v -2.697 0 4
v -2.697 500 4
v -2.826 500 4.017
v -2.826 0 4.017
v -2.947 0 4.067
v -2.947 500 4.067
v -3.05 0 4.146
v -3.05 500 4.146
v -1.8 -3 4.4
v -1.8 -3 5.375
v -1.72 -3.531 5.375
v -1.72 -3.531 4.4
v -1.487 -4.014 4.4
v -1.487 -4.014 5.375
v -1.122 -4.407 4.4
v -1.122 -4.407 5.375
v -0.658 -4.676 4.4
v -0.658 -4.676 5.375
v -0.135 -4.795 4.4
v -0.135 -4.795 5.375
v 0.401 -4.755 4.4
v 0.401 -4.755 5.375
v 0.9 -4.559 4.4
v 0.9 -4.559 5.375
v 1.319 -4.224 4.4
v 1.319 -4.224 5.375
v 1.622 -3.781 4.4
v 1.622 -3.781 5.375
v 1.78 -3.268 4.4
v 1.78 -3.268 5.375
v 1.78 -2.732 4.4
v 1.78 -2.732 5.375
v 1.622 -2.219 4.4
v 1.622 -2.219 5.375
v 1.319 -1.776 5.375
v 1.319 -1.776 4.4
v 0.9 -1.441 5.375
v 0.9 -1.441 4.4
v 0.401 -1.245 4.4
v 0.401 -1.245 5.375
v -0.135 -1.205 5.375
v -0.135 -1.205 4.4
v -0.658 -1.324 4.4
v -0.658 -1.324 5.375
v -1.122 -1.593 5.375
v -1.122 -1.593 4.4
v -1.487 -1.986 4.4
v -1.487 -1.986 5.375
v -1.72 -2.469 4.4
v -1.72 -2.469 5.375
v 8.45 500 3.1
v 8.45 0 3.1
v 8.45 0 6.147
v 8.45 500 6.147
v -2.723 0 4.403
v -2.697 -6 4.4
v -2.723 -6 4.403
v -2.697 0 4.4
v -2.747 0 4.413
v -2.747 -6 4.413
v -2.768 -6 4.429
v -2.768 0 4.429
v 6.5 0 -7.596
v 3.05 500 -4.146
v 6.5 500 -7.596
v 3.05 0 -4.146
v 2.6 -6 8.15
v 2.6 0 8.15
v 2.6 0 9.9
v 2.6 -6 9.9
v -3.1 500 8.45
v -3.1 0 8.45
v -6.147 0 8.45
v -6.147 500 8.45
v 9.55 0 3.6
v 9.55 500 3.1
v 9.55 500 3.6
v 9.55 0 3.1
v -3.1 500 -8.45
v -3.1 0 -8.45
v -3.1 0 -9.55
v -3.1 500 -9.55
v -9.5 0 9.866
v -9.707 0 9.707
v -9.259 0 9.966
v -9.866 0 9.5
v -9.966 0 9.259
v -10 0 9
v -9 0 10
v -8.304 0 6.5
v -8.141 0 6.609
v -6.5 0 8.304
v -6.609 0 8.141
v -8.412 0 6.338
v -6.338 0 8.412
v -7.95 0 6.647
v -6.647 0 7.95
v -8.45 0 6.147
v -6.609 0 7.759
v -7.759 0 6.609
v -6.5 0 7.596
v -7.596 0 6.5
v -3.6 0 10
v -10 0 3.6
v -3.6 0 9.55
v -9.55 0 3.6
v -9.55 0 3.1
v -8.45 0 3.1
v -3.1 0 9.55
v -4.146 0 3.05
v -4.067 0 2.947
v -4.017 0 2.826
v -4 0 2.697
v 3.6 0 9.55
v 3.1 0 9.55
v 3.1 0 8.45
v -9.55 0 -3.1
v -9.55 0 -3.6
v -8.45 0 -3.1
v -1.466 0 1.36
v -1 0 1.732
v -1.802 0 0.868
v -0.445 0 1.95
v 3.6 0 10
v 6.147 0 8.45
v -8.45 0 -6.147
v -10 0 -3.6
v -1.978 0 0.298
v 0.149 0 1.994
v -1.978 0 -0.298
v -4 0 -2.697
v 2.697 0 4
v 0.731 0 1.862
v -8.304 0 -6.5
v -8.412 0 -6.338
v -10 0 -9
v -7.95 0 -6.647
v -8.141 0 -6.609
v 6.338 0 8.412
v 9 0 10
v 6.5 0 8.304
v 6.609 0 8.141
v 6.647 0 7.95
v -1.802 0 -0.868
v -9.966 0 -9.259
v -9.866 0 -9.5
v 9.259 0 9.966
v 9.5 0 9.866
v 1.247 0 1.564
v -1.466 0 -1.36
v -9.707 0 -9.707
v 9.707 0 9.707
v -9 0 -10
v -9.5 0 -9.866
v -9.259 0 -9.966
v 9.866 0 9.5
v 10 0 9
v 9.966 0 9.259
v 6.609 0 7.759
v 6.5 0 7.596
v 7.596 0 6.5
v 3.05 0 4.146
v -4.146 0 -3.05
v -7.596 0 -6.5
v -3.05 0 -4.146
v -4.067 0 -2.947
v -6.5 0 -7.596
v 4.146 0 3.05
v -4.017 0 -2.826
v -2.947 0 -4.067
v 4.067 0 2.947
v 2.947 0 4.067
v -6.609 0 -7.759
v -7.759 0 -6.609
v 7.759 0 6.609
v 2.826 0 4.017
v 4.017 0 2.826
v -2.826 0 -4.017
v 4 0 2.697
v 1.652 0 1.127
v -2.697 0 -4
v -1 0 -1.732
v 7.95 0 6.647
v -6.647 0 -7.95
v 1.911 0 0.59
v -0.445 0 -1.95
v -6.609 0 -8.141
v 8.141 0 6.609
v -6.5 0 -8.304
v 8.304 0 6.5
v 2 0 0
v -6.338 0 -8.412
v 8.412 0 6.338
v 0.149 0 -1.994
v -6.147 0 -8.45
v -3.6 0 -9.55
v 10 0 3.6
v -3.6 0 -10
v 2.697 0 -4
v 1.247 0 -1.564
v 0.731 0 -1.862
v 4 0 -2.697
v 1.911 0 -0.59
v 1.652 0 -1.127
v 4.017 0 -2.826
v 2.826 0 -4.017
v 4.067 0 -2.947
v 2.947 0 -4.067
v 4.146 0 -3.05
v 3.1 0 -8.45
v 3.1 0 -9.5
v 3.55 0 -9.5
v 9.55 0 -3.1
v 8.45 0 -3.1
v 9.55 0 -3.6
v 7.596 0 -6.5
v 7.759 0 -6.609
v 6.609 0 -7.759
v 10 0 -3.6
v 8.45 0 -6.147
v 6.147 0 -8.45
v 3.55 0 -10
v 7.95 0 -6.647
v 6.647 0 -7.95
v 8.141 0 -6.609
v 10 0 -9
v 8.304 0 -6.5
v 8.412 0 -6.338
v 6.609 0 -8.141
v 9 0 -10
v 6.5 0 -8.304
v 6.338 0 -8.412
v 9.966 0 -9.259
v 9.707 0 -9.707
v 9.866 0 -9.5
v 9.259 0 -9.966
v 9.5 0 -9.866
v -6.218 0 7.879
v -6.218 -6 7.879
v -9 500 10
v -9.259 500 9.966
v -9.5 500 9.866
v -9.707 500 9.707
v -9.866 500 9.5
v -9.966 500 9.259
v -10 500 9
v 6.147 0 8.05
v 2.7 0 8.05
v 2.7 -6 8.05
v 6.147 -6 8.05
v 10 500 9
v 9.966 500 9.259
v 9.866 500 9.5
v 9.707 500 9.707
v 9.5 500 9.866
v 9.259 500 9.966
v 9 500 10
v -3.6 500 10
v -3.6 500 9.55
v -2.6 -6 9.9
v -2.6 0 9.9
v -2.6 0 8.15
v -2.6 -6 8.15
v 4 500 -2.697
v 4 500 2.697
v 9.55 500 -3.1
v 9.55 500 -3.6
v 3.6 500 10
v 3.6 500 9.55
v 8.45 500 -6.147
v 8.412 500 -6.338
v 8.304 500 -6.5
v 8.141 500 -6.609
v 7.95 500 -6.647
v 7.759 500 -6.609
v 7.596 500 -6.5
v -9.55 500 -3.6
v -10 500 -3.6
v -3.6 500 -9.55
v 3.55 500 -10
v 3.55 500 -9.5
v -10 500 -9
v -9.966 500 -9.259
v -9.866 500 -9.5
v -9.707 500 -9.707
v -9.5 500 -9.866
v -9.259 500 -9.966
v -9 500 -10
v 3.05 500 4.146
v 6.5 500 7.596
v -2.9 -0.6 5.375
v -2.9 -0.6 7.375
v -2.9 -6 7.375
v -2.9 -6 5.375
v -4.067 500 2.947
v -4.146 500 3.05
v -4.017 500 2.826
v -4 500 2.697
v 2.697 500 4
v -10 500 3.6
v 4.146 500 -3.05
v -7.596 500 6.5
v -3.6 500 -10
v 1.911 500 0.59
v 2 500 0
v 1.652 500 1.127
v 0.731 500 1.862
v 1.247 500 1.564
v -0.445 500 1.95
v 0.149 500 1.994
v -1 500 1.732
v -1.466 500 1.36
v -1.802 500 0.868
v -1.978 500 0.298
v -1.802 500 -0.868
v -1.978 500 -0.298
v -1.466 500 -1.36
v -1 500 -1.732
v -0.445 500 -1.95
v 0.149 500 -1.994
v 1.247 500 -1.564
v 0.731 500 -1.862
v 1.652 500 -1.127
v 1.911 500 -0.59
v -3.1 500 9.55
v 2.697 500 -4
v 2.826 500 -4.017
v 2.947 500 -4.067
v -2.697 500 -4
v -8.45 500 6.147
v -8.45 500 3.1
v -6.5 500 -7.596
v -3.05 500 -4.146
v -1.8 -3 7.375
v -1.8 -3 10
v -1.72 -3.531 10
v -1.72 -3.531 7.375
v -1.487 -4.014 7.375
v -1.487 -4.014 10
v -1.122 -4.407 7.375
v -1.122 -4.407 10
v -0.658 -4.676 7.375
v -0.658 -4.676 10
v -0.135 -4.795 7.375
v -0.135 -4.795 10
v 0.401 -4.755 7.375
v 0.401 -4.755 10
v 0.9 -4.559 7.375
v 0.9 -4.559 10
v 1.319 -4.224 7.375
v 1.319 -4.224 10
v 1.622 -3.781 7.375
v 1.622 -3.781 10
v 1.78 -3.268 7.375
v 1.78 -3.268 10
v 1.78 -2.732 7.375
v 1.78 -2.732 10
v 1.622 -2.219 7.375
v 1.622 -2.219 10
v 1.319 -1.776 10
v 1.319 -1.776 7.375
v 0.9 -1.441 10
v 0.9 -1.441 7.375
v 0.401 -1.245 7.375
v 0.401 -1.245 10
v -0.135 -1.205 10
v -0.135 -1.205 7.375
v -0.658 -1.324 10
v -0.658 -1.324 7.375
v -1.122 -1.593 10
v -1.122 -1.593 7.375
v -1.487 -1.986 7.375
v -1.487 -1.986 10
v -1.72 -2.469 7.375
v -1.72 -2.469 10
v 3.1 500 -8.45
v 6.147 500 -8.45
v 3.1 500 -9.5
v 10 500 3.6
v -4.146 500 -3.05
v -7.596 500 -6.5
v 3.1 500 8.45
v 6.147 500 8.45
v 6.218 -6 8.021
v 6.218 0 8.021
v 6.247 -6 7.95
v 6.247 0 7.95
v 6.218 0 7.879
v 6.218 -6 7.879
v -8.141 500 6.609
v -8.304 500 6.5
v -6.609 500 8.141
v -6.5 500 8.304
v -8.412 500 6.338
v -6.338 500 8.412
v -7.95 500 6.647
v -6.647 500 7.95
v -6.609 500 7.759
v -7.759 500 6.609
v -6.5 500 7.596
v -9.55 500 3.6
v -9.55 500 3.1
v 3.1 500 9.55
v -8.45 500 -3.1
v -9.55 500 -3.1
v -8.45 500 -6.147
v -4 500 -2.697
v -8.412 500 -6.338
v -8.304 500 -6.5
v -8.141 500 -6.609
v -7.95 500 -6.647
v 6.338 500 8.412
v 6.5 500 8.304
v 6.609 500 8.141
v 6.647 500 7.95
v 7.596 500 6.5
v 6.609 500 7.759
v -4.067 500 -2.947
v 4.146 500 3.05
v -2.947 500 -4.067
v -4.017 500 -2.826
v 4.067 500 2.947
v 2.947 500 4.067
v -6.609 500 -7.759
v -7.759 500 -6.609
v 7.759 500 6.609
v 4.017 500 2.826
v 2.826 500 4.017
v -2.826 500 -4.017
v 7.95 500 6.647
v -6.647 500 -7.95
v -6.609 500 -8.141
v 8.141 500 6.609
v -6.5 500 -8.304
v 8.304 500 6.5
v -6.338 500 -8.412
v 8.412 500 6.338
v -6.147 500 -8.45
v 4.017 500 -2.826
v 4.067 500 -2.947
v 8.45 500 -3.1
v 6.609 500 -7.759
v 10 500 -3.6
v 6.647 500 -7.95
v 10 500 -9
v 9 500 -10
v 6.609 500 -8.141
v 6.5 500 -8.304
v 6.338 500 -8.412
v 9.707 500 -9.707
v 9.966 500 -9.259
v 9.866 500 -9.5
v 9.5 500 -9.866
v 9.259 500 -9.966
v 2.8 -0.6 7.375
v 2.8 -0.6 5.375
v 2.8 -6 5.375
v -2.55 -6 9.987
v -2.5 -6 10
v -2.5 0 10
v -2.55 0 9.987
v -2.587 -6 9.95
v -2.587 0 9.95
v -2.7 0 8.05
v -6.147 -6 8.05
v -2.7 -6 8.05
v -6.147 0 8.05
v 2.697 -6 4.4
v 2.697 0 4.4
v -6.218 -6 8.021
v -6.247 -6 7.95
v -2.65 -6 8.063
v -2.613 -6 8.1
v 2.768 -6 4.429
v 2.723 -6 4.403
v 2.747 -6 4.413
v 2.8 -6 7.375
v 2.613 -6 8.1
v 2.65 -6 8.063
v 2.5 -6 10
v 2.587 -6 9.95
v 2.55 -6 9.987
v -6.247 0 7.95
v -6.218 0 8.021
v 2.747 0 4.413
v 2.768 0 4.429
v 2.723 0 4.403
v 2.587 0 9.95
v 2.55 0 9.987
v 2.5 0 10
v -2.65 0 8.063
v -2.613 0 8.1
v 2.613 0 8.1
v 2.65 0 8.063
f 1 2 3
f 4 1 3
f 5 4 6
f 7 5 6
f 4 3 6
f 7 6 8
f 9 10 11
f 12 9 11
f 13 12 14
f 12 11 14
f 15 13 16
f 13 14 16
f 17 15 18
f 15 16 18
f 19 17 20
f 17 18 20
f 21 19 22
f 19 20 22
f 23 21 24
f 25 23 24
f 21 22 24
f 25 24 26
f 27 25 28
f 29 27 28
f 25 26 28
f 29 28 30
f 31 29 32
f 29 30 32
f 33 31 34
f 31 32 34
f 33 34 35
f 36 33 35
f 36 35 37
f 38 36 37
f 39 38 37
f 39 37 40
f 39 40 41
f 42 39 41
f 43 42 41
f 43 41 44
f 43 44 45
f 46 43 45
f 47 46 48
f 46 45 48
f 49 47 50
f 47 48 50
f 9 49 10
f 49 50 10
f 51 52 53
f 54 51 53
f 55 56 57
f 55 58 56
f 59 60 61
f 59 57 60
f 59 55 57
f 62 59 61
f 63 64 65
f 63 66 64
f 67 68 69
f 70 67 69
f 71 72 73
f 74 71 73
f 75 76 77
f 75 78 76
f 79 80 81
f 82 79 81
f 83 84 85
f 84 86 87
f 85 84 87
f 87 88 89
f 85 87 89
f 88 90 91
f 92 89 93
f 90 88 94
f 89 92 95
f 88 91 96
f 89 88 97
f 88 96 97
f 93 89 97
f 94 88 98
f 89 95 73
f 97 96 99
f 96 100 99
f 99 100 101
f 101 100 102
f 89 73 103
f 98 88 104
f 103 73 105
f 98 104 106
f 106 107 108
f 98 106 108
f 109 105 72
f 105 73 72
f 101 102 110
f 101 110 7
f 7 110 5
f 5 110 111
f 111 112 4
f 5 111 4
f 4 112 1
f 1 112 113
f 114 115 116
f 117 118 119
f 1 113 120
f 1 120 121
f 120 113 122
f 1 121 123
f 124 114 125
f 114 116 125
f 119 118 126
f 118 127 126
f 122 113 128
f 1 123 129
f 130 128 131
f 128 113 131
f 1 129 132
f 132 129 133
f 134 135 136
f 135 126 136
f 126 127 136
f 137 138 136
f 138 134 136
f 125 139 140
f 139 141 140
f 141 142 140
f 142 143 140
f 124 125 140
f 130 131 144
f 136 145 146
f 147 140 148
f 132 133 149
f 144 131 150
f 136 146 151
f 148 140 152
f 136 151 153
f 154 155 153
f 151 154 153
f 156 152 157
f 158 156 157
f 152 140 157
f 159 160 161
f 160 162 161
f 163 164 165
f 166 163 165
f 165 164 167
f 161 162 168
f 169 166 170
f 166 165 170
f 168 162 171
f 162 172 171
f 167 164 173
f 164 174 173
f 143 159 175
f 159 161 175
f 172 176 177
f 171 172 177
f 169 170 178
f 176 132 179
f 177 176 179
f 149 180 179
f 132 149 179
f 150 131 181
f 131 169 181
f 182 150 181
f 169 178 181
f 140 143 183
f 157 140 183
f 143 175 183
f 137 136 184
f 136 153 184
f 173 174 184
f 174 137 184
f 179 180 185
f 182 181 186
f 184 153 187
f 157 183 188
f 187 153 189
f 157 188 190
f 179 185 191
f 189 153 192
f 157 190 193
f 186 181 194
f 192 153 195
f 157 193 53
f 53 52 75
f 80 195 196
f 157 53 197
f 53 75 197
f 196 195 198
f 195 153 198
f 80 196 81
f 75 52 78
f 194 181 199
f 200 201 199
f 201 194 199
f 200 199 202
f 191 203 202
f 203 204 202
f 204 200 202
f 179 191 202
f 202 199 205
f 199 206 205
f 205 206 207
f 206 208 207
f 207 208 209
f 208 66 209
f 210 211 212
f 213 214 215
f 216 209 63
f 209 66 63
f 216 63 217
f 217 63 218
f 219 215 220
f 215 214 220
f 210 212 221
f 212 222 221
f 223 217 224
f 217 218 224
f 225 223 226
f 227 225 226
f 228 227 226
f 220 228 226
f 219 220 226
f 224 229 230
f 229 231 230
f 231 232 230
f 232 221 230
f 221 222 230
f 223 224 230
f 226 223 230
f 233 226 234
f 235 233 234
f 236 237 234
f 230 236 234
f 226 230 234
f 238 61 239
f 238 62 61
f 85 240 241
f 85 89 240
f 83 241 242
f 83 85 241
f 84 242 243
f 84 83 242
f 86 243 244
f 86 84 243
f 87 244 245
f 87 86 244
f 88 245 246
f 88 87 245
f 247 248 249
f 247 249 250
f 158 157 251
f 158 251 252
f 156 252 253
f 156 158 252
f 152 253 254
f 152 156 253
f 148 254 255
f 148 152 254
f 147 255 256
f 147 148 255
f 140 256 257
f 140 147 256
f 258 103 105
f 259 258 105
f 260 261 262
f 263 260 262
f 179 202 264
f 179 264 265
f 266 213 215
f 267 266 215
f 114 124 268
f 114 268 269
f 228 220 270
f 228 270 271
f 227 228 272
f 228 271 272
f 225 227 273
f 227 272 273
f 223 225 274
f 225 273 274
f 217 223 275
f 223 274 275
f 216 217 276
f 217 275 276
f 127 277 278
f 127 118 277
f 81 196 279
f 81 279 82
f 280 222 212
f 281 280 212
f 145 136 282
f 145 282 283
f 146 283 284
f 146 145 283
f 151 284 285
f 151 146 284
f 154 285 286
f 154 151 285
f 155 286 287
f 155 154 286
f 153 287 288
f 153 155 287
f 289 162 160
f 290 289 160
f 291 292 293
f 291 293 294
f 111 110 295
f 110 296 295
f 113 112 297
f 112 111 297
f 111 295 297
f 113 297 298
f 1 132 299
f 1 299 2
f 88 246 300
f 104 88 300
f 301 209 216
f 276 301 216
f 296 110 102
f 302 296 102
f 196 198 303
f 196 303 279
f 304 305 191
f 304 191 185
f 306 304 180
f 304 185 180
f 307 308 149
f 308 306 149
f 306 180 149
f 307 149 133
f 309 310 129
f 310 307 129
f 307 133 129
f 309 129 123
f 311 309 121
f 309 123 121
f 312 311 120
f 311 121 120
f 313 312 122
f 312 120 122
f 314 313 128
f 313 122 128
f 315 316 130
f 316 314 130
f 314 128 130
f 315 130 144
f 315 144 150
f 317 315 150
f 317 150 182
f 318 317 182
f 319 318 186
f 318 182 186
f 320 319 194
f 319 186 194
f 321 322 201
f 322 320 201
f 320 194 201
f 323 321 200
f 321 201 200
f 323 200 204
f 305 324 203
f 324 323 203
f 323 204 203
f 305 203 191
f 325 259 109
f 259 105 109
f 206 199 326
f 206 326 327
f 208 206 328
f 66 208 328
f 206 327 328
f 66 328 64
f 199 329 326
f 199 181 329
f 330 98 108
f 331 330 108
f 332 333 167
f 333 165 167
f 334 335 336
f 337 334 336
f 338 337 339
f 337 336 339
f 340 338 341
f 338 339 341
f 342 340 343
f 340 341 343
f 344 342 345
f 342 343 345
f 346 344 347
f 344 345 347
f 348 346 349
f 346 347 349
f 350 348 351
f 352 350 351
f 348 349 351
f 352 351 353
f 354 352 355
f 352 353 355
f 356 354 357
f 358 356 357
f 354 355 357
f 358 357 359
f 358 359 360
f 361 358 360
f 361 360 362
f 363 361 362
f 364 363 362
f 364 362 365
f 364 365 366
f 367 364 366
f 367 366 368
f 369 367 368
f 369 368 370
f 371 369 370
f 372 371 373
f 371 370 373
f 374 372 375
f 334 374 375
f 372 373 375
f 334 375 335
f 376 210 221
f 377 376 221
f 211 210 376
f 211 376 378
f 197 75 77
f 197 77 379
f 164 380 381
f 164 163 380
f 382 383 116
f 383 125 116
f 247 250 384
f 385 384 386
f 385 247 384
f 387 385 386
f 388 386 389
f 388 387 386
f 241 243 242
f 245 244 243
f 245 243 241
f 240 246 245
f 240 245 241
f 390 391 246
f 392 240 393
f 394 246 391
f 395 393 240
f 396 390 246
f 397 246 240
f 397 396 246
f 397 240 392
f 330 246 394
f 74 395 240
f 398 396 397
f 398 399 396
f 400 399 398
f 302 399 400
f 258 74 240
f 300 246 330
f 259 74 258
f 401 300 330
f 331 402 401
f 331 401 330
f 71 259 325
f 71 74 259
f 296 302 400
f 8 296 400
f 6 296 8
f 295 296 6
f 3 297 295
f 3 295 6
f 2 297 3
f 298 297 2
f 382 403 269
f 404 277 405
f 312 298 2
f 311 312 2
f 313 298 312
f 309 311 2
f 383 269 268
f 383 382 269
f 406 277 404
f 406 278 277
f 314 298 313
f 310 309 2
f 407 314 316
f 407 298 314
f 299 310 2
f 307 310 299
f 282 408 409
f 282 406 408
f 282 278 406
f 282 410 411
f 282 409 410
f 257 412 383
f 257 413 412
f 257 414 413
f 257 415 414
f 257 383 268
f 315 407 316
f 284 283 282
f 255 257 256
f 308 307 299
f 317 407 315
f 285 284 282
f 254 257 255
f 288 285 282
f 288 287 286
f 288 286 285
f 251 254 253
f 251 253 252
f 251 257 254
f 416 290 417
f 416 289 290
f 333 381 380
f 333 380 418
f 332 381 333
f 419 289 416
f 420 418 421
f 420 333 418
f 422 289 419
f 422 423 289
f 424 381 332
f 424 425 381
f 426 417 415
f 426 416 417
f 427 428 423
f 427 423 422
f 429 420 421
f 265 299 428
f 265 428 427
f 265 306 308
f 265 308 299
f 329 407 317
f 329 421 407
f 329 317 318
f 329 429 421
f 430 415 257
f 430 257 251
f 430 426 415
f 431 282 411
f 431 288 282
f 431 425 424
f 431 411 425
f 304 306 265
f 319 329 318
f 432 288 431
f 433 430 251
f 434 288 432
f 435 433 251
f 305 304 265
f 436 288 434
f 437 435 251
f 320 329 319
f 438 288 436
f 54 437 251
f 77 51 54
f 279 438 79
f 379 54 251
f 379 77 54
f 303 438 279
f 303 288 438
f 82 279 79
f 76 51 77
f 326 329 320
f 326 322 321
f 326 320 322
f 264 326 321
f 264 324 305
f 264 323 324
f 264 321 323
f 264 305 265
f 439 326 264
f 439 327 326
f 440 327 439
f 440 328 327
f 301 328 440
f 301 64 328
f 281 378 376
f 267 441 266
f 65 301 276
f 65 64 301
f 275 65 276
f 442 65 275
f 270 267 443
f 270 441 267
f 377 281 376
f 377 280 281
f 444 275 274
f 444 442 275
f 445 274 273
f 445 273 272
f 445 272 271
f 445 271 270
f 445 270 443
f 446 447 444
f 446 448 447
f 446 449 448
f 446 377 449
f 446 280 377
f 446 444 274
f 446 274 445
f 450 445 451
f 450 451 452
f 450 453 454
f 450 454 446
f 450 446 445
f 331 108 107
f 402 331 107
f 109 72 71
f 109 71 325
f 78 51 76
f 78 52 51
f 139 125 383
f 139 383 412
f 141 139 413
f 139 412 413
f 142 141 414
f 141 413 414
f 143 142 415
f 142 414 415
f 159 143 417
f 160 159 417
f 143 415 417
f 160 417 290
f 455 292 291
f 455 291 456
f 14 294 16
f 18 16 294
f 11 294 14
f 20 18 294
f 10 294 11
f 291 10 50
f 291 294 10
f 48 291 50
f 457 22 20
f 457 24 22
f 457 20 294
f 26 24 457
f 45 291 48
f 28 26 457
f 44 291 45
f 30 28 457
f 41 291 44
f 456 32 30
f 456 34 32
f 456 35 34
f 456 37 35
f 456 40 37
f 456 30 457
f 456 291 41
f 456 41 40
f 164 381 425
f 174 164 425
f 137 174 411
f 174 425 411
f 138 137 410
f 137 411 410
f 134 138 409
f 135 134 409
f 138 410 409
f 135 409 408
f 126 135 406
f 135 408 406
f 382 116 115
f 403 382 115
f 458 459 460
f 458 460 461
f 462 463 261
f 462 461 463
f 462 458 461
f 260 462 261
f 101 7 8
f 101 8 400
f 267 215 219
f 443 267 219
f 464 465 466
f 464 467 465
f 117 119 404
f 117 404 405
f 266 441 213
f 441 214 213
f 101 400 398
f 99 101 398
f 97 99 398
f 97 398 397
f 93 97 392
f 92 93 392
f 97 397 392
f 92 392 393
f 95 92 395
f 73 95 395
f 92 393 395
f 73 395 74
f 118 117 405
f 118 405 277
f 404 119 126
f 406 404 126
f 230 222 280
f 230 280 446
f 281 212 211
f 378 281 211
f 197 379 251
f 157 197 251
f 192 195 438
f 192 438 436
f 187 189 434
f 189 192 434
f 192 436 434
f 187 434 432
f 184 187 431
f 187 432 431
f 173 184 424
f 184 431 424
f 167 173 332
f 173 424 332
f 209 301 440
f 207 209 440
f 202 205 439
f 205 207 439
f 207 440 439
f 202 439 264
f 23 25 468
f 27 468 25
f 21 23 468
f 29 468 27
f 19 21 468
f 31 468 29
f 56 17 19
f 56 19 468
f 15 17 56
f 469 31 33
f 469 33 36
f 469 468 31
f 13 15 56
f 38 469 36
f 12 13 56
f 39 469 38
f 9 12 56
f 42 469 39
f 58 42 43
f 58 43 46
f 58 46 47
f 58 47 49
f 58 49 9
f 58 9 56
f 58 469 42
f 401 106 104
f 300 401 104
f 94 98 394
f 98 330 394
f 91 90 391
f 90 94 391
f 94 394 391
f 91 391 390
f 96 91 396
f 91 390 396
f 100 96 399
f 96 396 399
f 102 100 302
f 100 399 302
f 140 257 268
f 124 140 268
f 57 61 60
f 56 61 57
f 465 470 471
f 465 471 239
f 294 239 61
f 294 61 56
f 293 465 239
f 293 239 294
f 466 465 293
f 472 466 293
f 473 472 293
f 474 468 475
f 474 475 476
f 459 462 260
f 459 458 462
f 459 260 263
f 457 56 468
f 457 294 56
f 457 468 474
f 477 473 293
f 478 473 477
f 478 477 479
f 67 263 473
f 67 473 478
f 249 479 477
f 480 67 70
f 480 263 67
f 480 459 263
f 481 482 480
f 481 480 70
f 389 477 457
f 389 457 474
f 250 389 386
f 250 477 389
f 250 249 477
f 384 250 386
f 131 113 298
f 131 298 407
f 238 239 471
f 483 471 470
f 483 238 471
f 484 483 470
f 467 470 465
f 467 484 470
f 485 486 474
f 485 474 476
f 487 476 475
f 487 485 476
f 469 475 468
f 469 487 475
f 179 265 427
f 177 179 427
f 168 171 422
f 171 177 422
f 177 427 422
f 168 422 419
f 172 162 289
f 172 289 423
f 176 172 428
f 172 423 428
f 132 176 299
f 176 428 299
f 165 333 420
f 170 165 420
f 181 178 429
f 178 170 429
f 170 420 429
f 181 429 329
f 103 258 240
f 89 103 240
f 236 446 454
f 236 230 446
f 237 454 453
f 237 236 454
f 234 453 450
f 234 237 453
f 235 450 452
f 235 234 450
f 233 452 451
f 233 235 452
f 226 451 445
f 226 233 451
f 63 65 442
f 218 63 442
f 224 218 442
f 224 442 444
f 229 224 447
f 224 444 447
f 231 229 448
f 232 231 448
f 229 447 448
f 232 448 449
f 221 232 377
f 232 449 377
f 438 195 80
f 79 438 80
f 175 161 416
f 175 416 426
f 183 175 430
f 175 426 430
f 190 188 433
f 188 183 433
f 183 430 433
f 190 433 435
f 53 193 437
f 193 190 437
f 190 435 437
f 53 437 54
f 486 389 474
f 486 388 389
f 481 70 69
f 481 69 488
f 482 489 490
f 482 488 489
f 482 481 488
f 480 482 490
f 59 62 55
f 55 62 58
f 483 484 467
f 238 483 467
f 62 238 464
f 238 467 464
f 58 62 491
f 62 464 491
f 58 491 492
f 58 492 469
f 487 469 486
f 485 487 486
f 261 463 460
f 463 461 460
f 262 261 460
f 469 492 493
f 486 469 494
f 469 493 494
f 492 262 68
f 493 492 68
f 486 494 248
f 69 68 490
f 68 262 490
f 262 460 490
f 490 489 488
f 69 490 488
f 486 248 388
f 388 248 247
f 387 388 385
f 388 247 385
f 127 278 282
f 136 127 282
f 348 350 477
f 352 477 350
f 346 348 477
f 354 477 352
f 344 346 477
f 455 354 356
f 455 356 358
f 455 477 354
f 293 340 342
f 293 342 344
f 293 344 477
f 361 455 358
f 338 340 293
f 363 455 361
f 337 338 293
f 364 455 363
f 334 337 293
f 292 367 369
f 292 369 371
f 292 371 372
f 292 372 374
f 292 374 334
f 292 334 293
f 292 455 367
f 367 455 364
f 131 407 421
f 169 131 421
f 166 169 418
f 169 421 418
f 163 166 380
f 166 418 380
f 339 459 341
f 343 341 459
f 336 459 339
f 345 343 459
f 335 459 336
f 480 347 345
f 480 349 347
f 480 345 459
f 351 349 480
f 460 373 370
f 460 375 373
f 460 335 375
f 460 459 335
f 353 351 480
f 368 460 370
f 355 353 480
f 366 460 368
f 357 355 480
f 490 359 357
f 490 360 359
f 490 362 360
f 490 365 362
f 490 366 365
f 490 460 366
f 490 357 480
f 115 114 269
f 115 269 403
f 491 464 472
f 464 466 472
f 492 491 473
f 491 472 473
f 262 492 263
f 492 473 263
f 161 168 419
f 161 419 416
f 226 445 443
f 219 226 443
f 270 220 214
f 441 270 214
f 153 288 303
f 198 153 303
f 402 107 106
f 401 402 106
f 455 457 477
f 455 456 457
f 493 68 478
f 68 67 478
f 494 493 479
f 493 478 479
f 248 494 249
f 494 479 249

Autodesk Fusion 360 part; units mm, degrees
sketch "Sketch1" plane through (0, 0, 0) normal (0, 1, 0) x (1, 0, 0) in component "2020-extrusion v1"
  line L0 (9, -10) -> (-9, -10)
  line L1 (-10, -9) -> (-10, 9)
  line L2 (-9, 10) -> (9, 10)
  line L3 (10, 9) -> (10, -9)
  line L4 (10, -10) -> (-10, 10) construction
  line L5 (-10, -10) -> (10, 10) construction
  line L6 (4, -4) -> (-4, -4)
  line L7 (-4, -4) -> (-4, 4)
  line L8 (-4, 4) -> (4, 4)
  line L9 (4, 4) -> (4, -4)
  line L10 (4, -4) -> (-4, 4) construction
  line L11 (-4, -4) -> (4, 4) construction
  circle A0 centre (0, 0) radius 2
  line L12 (8.45, -8.45) -> (-8.45, -8.45)
  line L13 (-8.45, -8.45) -> (-8.45, 8.45)
  line L14 (-8.45, 8.45) -> (8.45, 8.45)
  line L15 (8.45, 8.45) -> (8.45, -8.45)
  line L16 (8.45, -8.45) -> (-8.45, 8.45) construction
  line L17 (-8.45, -8.45) -> (8.45, 8.45) construction
  line L18 (-9.452, -10.548) -> (10.548, 9.452) construction
  line L19 (-10.548, -9.452) -> (9.452, 10.548) construction
  line L20 (10.548, -9.452) -> (-9.452, 10.548) construction
  line L21 (9.452, -10.548) -> (-10.548, 9.452) construction
  line L22 (3.1, -10) -> (-3.1, -10) construction
  line L23 (-3.1, -10) -> (-3.1, 10) construction
  line L24 (-3.1, 10) -> (3.1, 10) construction
  line L25 (3.1, 10) -> (3.1, -10) construction
  line L26 (10, -3.1) -> (-10, -3.1) construction
  line L27 (-10, -3.1) -> (-10, 3.1) construction
  line L28 (-10, 3.1) -> (10, 3.1) construction
  line L29 (10, 3.1) -> (10, -3.1) construction
  line L30 (-3.1, -8.45) -> (-3.1, -10)
  line L31 (3.1, -8.45) -> (3.1, -10)
  line L32 (-8.45, -3.1) -> (-10, -3.1)
  line L33 (-8.45, 3.1) -> (-10, 3.1)
  line L34 (8.45, -3.1) -> (10, -3.1)
  line L35 (8.45, 3.1) -> (10, 3.1)
  line L36 (-3.1, 8.45) -> (-3.1, 10)
  line L37 (3.1, 8.45) -> (3.1, 10)
  line L38 (-4, 2.904) -> (-8.45, 7.354)
  line L39 (-2.904, 4) -> (-7.354, 8.45)
  line L40 (2.904, 4) -> (7.354, 8.45)
  line L41 (4, 2.904) -> (8.45, 7.354)
  line L42 (-4, -2.904) -> (-8.45, -7.354)
  line L43 (-2.904, -4) -> (-7.354, -8.45)
  line L44 (2.904, -4) -> (7.354, -8.45)
  line L45 (4, -2.904) -> (8.45, -7.354)
  line L46 (-10, -3.1) -> (-9.55, -3.1)
  line L47 (-9.55, -3.1) -> (-9.55, -3.6)
  line L48 (-9.55, -3.6) -> (-10, -3.6)
  line L49 (-10, -3.6) -> (-10, -3.1)
  line L50 (-10, 3.1) -> (-9.55, 3.1)
  line L51 (-9.55, 3.1) -> (-9.55, 3.6)
  line L52 (-9.55, 3.6) -> (-10, 3.6)
  line L53 (-10, 3.6) -> (-10, 3.1)
  line L54 (-3.1, -10) -> (-3.6, -10)
  line L55 (-3.6, -10) -> (-3.6, -9.55)
  line L56 (-3.6, -9.55) -> (-3.1, -9.55)
  line L57 (-3.1, -9.55) -> (-3.1, -10)
  line L58 (3.1, -10) -> (3.6, -10)
  line L59 (3.6, -10) -> (3.6, -9.55)
  line L60 (3.6, -9.55) -> (3.1, -9.55)
  line L61 (3.1, -9.55) -> (3.1, -10)
  line L62 (10, -3.1) -> (9.55, -3.1)
  line L63 (9.55, -3.1) -> (9.55, -3.6)
  line L64 (9.55, -3.6) -> (10, -3.6)
  line L65 (10, -3.6) -> (10, -3.1)
  line L66 (10, 3.1) -> (9.55, 3.1)
  line L67 (9.55, 3.1) -> (9.55, 3.6)
  line L68 (9.55, 3.6) -> (10, 3.6)
  line L69 (10, 3.6) -> (10, 3.1)
  line L70 (-3.1, 10) -> (-3.6, 10)
  line L71 (-3.6, 10) -> (-3.6, 9.55)
  line L72 (-3.6, 9.55) -> (-3.1, 9.55)
  line L73 (-3.1, 9.55) -> (-3.1, 10)
  line L74 (3.1, 10) -> (3.55, 10)
  line L75 (3.55, 10) -> (3.55, 9.5)
  line L76 (3.55, 9.5) -> (3.1, 9.5)
  line L77 (3.1, 9.5) -> (3.1, 10)
  arc A1 (-10, -9) -> (-9, -10) centre (-9, -9) ccw
  arc A2 (9, -10) -> (10, -9) centre (9, -9) ccw
  arc A3 (10, 9) -> (9, 10) centre (9, 9) ccw
  arc A4 (-9, 10) -> (-10, 9) centre (-9, 9) ccw
  dimension "d1" = 20
  dimension "d2" = 20
  dimension "d3" = 8
  dimension "d4" = 8
  dimension "d5" = 4
  dimension "d6" = 16.9
  dimension "d7" = 16.9
  dimension "d8" = 0.775
  dimension "d9" = -0.775
  dimension "d10" = 0.775
  dimension "d11" = -0.775
  dimension "d12" = 6.2
  dimension "d13" = 20
  dimension "d14" = 20
  dimension "d15" = 6.2
  dimension "d16" = 1.55
  dimension "d17" = 1.55
  dimension "d18" = 1.55
  dimension "d19" = 1.55
  dimension "d20" = 1.55
  dimension "d21" = 1.55
  dimension "d22" = 1.55
  dimension "d23" = 1.55
  dimension "d24" = 0.45
  dimension "d25" = 0.5
  dimension "d26" = 0.45
  dimension "d27" = 0.5
  dimension "d28" = 0.5
  dimension "d29" = 0.45
  dimension "d30" = 0.5
  dimension "d31" = 0.45
  dimension "d32" = 0.45
  dimension "d33" = 0.5
  dimension "d34" = 0.45
  dimension "d35" = 0.5
  dimension "d36" = 0.5
  dimension "d37" = 0.45
  dimension "d38" = 0.45
  dimension "d39" = 0.5
  dimension "d40" = 1
  dimension "d41" = 1
  dimension "d42" = 1
  dimension "d43" = 1
extrude "Extrude1" add sketch "Sketch1" along normal blind 500 contours L0 L3 L12 L15 L31 L34 L59 L60 L63 L64 A2 | L0 L1 L12 L13 L30 L32 L47 L48 L55 L56 A1 | L6 L9 L12 L15 L44 L45 | L2 L3 L14 L15 L35 L37 L67 L68 L75 L76 A3 | L6 L7 L12 L13 L42 L43 | L6 L7 L8 L9 | L8 L9 L14 L15 L40 L41 | L1 L2 L13 L14 L33 L36 L51 L52 L71 L72 A4 | L7 L8 L13 L14 L38 L39 makes body 1 in component "2020-extrusion v1"
fillet "Fillet1" radius 0.5 16 edges at (-8.45, 250, -7.354) (-7.354, 250, -8.45) (7.354, 250, -8.45) (8.45, 250, -7.354) (8.45, 250, 7.354) (7.354, 250, 8.45) (-7.354, 250, 8.45) (-8.45, 250, 7.354) (-2.904, 250, 4) (2.904, 250, 4) (-4, 250, 2.904) (-4, 250, -2.904) (-2.904, 250, -4) (2.904, 250, -4) (4, 250, -2.904) (4, 250, 2.904) on bodies 1 in component "2020-extrusion v1"
sketch "Sketch1 (2)" plane through (0, 0, 0) normal (0, -1, 0) x (1, 0, 0)
  circle A0 centre (0, 0) radius 2
  line L0 (-9, -10) -> (-3.6, -10)
  line L1 (-3.6, -10) -> (-3.6, -9.55)
  line L2 (-3.6, -9.55) -> (-3.1, -9.55)
  line L3 (-3.1, -9.55) -> (-3.1, -8.45)
  line L4 (-3.1, -8.45) -> (-6.1469, -8.45)
  arc A1 (-6.5004, -7.5964) -> (-6.1469, -8.45) centre (-6.1469, -7.95) ccw
  line L5 (-6.5004, -7.5964) -> (-3.0504, -4.1464)
  arc A2 (-2.6969, -4) -> (-3.0504, -4.1464) centre (-2.6969, -4.5) ccw
  line L6 (-2.6969, -4) -> (2.6969, -4)
  arc A3 (3.0504, -4.1464) -> (2.6969, -4) centre (2.6969, -4.5) ccw
  line L7 (3.0504, -4.1464) -> (6.5004, -7.5964)
  arc A4 (6.1469, -8.45) -> (6.5004, -7.5964) centre (6.1469, -7.95) ccw
  line L8 (6.1469, -8.45) -> (3.1, -8.45)
  line L9 (3.1, -8.45) -> (3.1, -9.5)
  line L10 (3.1, -9.5) -> (3.55, -9.5)
  line L11 (3.55, -9.5) -> (3.55, -10)
  line L12 (3.55, -10) -> (9, -10)
  arc A5 (9, -10) -> (10, -9) centre (9, -9) ccw
  line L13 (10, -9) -> (10, -3.6)
  line L14 (10, -3.6) -> (9.55, -3.6)
  line L15 (9.55, -3.6) -> (9.55, -3.1)
  line L16 (9.55, -3.1) -> (8.45, -3.1)
  line L17 (8.45, -3.1) -> (8.45, -6.1469)
  arc A6 (7.5964, -6.5004) -> (8.45, -6.1469) centre (7.95, -6.1469) ccw
  line L18 (7.5964, -6.5004) -> (4.1464, -3.0504)
  arc A7 (4, -2.6969) -> (4.1464, -3.0504) centre (4.5, -2.6969) ccw
  line L19 (4, -2.6969) -> (4, 2.6969)
  arc A8 (4.1464, 3.0504) -> (4, 2.6969) centre (4.5, 2.6969) ccw
  line L20 (4.1464, 3.0504) -> (7.5964, 6.5004)
  arc A9 (8.45, 6.1469) -> (7.5964, 6.5004) centre (7.95, 6.1469) ccw
  line L21 (8.45, 6.1469) -> (8.45, 3.1)
  line L22 (8.45, 3.1) -> (9.55, 3.1)
  line L23 (9.55, 3.1) -> (9.55, 3.6)
  line L24 (9.55, 3.6) -> (10, 3.6)
  line L25 (10, 3.6) -> (10, 9)
  arc A10 (10, 9) -> (9, 10) centre (9, 9) ccw
  line L26 (9, 10) -> (3.6, 10)
  line L27 (3.6, 10) -> (3.6, 9.55)
  line L28 (3.6, 9.55) -> (3.1, 9.55)
  line L29 (3.1, 9.55) -> (3.1, 8.45)
  line L30 (3.1, 8.45) -> (6.1469, 8.45)
  arc A11 (6.5004, 7.5964) -> (6.1469, 8.45) centre (6.1469, 7.95) ccw
  line L31 (6.5004, 7.5964) -> (3.0504, 4.1464)
  arc A12 (2.6969, 4) -> (3.0504, 4.1464) centre (2.6969, 4.5) ccw
  line L32 (2.6969, 4) -> (-2.6969, 4)
  arc A13 (-3.0504, 4.1464) -> (-2.6969, 4) centre (-2.6969, 4.5) ccw
  line L33 (-3.0504, 4.1464) -> (-6.5004, 7.5964)
  arc A14 (-6.1469, 8.45) -> (-6.5004, 7.5964) centre (-6.1469, 7.95) ccw
  line L34 (-6.1469, 8.45) -> (-3.1, 8.45)
  line L35 (-3.1, 8.45) -> (-3.1, 9.55)
  line L36 (-3.1, 9.55) -> (-3.6, 9.55)
  line L37 (-3.6, 9.55) -> (-3.6, 10)
  line L38 (-3.6, 10) -> (-9, 10)
  arc A15 (-9, 10) -> (-10, 9) centre (-9, 9) ccw
  line L39 (-10, 9) -> (-10, 3.6)
  line L40 (-10, 3.6) -> (-9.55, 3.6)
  line L41 (-9.55, 3.6) -> (-9.55, 3.1)
  line L42 (-9.55, 3.1) -> (-8.45, 3.1)
  line L43 (-8.45, 3.1) -> (-8.45, 6.1469)
  arc A16 (-7.5964, 6.5004) -> (-8.45, 6.1469) centre (-7.95, 6.1469) ccw
  line L44 (-7.5964, 6.5004) -> (-4.1464, 3.0504)
  arc A17 (-4, 2.6969) -> (-4.1464, 3.0504) centre (-4.5, 2.6969) ccw
  line L45 (-4, 2.6969) -> (-4, -2.6969)
  arc A18 (-4.1464, -3.0504) -> (-4, -2.6969) centre (-4.5, -2.6969) ccw
  line L46 (-4.1464, -3.0504) -> (-7.5964, -6.5004)
  arc A19 (-8.45, -6.1469) -> (-7.5964, -6.5004) centre (-7.95, -6.1469) ccw
  line L47 (-8.45, -6.1469) -> (-8.45, -3.1)
  line L48 (-8.45, -3.1) -> (-9.55, -3.1)
  line L49 (-9.55, -3.1) -> (-9.55, -3.6)
  line L50 (-9.55, -3.6) -> (-10, -3.6)
  line L51 (-10, -3.6) -> (-10, -9)
  arc A20 (-10, -9) -> (-9, -10) centre (-9, -9) ccw
  line L52 (-3.1, 8.45) -> (3.1, 8.45)
  line L53 (-3.1, 8.05) -> (3.1, 8.05)
  line L54 (3.1, 8.05) -> (6.1469, 8.05)
  arc A21 (6.2176, 7.8793) -> (6.1469, 8.05) centre (6.1469, 7.95) ccw
  line L55 (6.2176, 7.8793) -> (2.7676, 4.4293)
  arc A22 (2.6969, 4.4) -> (2.7676, 4.4293) centre (2.6969, 4.5) ccw
  line L56 (2.6969, 4.4) -> (-2.6969, 4.4)
  arc A23 (-2.7676, 4.4293) -> (-2.6969, 4.4) centre (-2.6969, 4.5) ccw
  line L57 (-2.7676, 4.4293) -> (-6.2176, 7.8793)
  arc A24 (-6.1469, 8.05) -> (-6.2176, 7.8793) centre (-6.1469, 7.95) ccw
  line L58 (-6.1469, 8.05) -> (-3.1, 8.05)
  line L59 (-3.1, 8.05) -> (2.802, 8.05) construction
  line L60 (2.802, 8.05) -> (2.802, 4.1083) construction
  line L61 (2.802, 4.1083) -> (-3.1, 4.1083) construction
  line L62 (-3.1, 4.1083) -> (-3.1, 8.05) construction
  line L63 (-3.1, 8.05) -> (2.802, 4.1083) construction
  line L64 (2.802, 8.05) -> (-3.1, 4.1083) construction
  line L65 (2.8, 7.375) -> (-2.9, 7.375)
  line L66 (-2.9, 7.375) -> (-2.9, 5.375)
  line L67 (-2.9, 5.375) -> (2.8, 5.375)
  line L68 (2.8, 5.375) -> (2.8, 7.375)
  line L69 (-0.149, 6.0792) -> (-0.149, 6.2792) construction
  line L70 (-3.1, 8.05) -> (-3.1, 10)
  line L71 (-3.1, 10) -> (3.1, 10)
  line L72 (3.1, 10) -> (3.1, 8.05)
  line L73 (-3.1, 10) -> (3.1, 8.05) construction
  line L74 (3.1, 10) -> (-3.1, 8.05) construction
  line L75 (2.6, 10) -> (-2.6, 10)
  line L76 (-2.6, 10) -> (-2.6, 8.05)
  line L77 (-2.6, 8.05) -> (2.6, 8.05)
  line L78 (2.6, 8.05) -> (2.6, 10)
  line L79 (2.6, 10) -> (-2.6, 8.05) construction
  line L80 (-2.6, 10) -> (2.6, 8.05) construction
  point P0 (-0.149, 6.0792)
  point P1 (0, 9.025)
  dimension "d48" = -0.4
  dimension "d49" = 5.7
  dimension "d50" = 2
  dimension "d58" = 0.2
  dimension "d60" = 0
  dimension "d63" = 5.2
  dimension "d64" = 1.95
extrude "Extrude1'" add sketch "Sketch1 (2)" along normal blind 6 separate body contours L53 L54 A21 L55 A22 L56 A23 L57 A24 L58 L77 makes body 2
extrude "Extrude3" add sketch "Sketch1 (2)" along normal blind 0.6 contours L65 L66 L67 L68 bodies 2
extrude "Extrude6" add sketch "Sketch1 (2)" along normal blind 6 contours L52 L71 L75 L76 L78 | L52 L53 L76 L77 L78 bodies 2
fillet "Fillet1'" radius 0.1 4 edges at (-2.6, -3, 8.05) (-2.6, -3, 10) (2.6, -3, 8.05) (2.6, -3, 10) on bodies 2
sketch "Sketch3" plane through (0, 0, 10) normal (0, 0, 1) x (-1, 0, 0)
  line L0 (-2.5, 6) -> (-2.5, 0)
  line L1 (-2.5, 0) -> (2.5, 0)
  line L2 (2.5, 0) -> (2.5, 6)
  line L3 (2.5, 6) -> (-2.5, 6)
  line L4 (-2.5, 0) -> (2.5, 6) construction
  line L5 (-2.5, 6) -> (2.5, 0) construction
  circle A0 centre (0, 3) radius 1.8
  dimension "d69" = 3.6
extrude "Extrude7" cut sketch "Sketch3" against normal blind 5.6 contours A0 bodies 2
component "2020-extrusion v1" placed x (1, 0, 0) y (0, 1, 0) z (0, 0, 1) at (0, 0, 0)
equation "d6 = 20 mm - ( ( 1.55 * 2 ) * 1 mm )"
equation "d7 = 20 mm - ( ( 1.55 * 2 ) * 1 mm )"
equation "d8 = ( 1.55 / 2 ) * 1 mm"
equation "d9 = ( -1.55 / 2 ) * 1 mm"
equation "d10 = ( 1.55 / 2 ) * 1 mm"
equation "d11 = ( -1.55 / 2 ) * 1 mm"
